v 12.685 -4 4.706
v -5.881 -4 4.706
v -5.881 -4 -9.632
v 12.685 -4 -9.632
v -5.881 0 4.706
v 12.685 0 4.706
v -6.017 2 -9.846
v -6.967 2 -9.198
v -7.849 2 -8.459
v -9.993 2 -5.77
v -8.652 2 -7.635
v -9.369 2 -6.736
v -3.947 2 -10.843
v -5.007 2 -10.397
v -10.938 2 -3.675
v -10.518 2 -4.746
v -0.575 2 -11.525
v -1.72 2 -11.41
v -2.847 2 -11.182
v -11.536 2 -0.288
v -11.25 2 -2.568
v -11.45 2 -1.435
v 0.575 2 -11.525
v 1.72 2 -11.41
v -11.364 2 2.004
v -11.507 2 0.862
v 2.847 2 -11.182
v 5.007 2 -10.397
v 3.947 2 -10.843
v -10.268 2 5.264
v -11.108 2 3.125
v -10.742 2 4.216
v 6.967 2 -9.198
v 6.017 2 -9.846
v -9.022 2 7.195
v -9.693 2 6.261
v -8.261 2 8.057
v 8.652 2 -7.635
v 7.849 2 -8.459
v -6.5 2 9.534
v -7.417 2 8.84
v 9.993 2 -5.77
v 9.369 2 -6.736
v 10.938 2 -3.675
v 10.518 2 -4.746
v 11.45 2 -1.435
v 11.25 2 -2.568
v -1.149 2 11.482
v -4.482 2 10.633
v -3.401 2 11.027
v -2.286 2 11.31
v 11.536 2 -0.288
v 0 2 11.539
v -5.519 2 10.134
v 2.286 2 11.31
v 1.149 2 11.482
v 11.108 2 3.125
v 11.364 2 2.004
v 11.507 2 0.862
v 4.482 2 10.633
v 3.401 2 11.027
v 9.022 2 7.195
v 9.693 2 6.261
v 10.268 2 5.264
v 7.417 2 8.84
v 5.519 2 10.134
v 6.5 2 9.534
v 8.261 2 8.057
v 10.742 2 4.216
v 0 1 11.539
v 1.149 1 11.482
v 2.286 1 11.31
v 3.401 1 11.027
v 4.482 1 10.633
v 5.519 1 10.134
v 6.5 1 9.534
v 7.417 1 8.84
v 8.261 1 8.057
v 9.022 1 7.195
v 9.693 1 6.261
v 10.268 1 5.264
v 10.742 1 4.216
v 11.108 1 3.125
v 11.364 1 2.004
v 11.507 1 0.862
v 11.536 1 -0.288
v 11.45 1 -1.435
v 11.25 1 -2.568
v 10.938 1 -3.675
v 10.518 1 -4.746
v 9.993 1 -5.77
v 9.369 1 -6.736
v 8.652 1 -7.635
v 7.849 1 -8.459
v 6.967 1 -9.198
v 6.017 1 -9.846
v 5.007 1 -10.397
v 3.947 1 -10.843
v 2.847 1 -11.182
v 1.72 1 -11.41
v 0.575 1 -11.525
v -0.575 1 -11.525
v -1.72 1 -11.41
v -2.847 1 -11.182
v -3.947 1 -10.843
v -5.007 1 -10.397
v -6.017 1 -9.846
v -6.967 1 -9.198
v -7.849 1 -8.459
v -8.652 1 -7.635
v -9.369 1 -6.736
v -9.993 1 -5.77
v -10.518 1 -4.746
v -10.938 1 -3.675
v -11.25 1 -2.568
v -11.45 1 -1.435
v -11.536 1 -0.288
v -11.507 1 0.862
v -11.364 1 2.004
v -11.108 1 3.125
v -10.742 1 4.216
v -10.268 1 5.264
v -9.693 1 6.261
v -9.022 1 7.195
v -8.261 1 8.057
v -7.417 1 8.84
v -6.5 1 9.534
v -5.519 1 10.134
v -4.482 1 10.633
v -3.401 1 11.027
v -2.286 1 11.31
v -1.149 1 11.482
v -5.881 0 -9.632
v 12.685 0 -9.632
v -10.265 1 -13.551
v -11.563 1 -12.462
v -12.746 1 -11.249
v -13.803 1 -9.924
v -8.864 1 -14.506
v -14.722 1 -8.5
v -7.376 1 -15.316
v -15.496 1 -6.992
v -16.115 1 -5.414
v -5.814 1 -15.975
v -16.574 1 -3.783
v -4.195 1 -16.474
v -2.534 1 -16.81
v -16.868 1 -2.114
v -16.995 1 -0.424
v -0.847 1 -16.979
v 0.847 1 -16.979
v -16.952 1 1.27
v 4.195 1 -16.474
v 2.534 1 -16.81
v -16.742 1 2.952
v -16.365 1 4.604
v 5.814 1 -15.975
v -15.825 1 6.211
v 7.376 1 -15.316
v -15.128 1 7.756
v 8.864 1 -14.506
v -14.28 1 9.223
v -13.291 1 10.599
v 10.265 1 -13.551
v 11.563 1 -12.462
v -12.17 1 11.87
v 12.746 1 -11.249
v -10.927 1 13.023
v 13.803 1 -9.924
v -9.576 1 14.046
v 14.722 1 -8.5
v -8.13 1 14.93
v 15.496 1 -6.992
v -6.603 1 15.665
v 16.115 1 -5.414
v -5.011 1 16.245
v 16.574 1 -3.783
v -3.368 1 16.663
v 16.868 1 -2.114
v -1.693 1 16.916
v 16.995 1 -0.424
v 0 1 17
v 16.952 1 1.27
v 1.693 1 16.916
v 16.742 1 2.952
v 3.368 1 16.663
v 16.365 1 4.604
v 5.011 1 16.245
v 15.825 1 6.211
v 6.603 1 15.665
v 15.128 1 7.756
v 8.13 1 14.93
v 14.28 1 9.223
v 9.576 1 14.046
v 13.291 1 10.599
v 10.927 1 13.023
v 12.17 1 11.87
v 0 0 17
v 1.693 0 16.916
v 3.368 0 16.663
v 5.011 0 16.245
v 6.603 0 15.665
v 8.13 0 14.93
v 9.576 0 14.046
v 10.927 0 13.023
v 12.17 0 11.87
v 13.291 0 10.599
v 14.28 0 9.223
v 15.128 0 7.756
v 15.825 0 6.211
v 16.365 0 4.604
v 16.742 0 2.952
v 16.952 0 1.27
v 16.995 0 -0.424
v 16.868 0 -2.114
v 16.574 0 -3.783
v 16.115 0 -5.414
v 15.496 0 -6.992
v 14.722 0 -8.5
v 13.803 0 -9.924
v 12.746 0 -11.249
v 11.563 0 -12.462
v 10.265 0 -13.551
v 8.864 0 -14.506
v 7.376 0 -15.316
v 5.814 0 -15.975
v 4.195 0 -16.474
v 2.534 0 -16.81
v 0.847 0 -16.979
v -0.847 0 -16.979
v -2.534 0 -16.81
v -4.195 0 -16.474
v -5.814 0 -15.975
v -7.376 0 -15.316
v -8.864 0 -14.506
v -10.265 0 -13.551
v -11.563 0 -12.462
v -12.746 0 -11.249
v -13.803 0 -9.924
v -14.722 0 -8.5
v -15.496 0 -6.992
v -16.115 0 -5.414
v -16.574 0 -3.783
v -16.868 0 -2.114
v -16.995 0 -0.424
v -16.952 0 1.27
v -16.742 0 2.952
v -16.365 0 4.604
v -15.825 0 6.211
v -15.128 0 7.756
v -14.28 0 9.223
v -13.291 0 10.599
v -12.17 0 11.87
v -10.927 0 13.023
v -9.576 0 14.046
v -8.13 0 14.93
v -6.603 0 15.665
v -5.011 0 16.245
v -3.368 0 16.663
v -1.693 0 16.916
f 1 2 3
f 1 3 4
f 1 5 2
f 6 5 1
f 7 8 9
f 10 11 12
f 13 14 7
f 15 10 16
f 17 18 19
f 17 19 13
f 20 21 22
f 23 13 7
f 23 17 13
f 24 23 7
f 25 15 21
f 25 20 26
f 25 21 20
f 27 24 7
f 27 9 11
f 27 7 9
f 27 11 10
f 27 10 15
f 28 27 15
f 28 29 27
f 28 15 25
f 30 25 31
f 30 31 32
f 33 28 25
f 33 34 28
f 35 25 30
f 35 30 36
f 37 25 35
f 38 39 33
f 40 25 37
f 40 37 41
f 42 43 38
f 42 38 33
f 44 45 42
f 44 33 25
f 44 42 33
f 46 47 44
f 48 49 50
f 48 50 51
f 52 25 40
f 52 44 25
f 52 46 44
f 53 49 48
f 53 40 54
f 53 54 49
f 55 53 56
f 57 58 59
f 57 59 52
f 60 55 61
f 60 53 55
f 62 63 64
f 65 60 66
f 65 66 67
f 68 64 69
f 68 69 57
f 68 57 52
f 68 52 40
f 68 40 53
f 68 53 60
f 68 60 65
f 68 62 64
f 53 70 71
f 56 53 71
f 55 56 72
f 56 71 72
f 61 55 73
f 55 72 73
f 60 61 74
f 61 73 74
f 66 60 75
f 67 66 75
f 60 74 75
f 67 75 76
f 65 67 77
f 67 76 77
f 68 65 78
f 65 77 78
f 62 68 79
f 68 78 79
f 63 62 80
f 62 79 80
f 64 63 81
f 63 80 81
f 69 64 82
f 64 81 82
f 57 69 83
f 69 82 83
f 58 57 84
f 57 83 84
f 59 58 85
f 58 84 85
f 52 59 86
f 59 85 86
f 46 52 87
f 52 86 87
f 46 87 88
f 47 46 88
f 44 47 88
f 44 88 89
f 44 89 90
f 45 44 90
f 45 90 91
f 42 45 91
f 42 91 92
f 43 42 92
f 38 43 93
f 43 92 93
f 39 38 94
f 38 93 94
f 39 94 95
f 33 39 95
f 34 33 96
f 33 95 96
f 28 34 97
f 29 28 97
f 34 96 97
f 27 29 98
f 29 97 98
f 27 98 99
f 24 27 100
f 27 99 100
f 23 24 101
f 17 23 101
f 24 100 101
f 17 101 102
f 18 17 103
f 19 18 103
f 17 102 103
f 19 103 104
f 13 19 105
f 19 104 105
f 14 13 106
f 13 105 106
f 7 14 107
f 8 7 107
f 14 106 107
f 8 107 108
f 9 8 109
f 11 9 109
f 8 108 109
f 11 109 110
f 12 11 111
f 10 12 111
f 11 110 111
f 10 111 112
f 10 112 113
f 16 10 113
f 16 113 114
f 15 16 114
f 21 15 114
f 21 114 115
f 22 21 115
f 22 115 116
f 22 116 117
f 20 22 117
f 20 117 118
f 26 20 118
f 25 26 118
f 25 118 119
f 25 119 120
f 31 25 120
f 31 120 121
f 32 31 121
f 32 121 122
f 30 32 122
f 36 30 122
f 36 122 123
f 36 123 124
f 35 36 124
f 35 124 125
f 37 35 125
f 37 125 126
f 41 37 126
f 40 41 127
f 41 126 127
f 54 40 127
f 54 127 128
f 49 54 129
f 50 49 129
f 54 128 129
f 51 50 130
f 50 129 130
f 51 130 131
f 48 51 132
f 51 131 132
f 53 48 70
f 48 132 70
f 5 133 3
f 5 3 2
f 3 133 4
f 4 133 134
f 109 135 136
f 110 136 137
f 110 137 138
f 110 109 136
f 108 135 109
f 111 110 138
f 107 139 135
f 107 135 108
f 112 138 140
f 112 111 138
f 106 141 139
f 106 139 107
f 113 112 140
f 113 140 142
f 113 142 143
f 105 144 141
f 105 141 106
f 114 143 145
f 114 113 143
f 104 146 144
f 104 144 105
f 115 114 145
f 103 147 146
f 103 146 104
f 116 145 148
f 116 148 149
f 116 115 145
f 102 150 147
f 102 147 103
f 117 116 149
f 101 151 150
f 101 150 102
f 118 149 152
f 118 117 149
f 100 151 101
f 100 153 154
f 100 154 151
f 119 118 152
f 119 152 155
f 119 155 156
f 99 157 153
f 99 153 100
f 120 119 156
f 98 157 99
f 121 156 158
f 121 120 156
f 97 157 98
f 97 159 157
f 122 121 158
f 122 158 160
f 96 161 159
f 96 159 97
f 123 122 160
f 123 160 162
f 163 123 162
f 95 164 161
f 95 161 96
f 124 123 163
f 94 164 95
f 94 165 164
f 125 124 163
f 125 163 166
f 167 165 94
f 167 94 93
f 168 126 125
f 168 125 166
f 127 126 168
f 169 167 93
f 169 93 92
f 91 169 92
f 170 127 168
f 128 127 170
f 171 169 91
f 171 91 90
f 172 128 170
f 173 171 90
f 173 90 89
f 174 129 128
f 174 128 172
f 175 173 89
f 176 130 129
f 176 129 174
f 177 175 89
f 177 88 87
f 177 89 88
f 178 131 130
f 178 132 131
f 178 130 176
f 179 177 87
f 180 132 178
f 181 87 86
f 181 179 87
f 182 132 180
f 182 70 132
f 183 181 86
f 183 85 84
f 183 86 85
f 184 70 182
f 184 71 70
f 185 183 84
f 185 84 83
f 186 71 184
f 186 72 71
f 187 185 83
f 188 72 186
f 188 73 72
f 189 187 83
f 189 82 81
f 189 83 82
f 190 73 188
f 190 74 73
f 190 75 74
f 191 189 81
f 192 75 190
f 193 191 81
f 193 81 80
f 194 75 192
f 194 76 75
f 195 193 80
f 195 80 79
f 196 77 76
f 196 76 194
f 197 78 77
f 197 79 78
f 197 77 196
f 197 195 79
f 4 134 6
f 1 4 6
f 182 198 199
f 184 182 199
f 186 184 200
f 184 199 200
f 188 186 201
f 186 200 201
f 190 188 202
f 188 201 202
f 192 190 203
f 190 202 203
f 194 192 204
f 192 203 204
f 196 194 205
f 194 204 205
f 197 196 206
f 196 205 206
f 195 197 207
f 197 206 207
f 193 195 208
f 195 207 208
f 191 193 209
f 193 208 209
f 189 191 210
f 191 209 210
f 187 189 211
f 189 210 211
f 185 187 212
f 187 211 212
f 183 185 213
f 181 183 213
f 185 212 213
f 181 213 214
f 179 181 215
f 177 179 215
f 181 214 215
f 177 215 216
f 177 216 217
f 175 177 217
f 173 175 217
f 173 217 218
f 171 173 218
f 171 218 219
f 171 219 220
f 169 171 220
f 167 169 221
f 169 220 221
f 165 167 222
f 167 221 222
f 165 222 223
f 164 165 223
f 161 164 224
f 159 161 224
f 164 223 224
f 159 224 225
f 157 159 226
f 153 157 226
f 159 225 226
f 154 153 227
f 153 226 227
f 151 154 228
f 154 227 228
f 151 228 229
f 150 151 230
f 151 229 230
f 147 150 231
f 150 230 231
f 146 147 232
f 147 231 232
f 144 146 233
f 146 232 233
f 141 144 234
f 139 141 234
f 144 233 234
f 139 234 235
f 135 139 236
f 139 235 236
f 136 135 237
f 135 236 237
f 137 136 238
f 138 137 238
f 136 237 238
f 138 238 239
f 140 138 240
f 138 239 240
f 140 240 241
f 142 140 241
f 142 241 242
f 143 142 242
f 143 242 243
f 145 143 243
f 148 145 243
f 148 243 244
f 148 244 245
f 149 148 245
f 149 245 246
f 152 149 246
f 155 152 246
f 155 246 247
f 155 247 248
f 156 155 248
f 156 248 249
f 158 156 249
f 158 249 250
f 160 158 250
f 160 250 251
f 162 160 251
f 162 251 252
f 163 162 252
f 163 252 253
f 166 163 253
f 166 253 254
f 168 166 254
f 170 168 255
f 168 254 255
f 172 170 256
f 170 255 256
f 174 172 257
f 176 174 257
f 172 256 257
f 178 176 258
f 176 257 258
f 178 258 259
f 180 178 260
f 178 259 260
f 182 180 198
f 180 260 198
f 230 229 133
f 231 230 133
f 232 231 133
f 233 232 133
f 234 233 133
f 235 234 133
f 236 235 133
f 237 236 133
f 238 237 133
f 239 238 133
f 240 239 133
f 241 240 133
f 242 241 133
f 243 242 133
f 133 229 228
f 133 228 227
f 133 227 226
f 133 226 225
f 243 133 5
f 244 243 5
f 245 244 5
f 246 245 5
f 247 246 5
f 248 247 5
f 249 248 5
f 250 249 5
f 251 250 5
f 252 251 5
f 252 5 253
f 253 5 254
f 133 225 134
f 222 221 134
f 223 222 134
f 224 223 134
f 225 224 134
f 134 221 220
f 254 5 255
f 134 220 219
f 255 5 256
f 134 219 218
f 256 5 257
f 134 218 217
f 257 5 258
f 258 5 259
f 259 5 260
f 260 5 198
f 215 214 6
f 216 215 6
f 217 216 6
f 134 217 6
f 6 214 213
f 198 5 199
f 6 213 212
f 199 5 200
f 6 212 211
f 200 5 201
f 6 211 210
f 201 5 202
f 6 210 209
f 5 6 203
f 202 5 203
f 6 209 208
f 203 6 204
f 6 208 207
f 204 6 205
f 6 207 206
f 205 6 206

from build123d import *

# Parameters (mm, degrees)
SKETCH1_R           = 17
BOSS_EXTRUDE1_DEPTH = 1
SKETCH2_W           = 18.565645136
SKETCH2_H           = 14.338667356
BOSS_EXTRUDE2_DEPTH = 4
SKETCH3_R           = 11.539294854
BOSS_EXTRUDE3_DEPTH = 1


with BuildPart() as part:
    # Sketch1 → Boss-Extrude1 (new body)
    with BuildSketch(Plane(origin=(0, 0, 0), x_dir=(1, 0, 0), z_dir=(0, 1, 0))):
        with Locations(Location((0, 0, 0), (0, 0, 270))):
            Circle(SKETCH1_R)
    extrude(amount=BOSS_EXTRUDE1_DEPTH)

    # Sketch2 → Boss-Extrude2 (add)
    with BuildSketch(Plane.XZ):
        with Locations((3.402156218, -2.462998516)):
            Rectangle(SKETCH2_W, SKETCH2_H)
    extrude(amount=BOSS_EXTRUDE2_DEPTH)

    # Sketch3 → Boss-Extrude3 (add)
    with BuildSketch(Plane(origin=(0, 1, 0), x_dir=(1, 0, 0), z_dir=(0, 1, 0))):
        with Locations(Location((0, 0, 0), (0, 0, 270))):
            Circle(SKETCH3_R)
    extrude(amount=BOSS_EXTRUDE3_DEPTH)


solid = part.part
